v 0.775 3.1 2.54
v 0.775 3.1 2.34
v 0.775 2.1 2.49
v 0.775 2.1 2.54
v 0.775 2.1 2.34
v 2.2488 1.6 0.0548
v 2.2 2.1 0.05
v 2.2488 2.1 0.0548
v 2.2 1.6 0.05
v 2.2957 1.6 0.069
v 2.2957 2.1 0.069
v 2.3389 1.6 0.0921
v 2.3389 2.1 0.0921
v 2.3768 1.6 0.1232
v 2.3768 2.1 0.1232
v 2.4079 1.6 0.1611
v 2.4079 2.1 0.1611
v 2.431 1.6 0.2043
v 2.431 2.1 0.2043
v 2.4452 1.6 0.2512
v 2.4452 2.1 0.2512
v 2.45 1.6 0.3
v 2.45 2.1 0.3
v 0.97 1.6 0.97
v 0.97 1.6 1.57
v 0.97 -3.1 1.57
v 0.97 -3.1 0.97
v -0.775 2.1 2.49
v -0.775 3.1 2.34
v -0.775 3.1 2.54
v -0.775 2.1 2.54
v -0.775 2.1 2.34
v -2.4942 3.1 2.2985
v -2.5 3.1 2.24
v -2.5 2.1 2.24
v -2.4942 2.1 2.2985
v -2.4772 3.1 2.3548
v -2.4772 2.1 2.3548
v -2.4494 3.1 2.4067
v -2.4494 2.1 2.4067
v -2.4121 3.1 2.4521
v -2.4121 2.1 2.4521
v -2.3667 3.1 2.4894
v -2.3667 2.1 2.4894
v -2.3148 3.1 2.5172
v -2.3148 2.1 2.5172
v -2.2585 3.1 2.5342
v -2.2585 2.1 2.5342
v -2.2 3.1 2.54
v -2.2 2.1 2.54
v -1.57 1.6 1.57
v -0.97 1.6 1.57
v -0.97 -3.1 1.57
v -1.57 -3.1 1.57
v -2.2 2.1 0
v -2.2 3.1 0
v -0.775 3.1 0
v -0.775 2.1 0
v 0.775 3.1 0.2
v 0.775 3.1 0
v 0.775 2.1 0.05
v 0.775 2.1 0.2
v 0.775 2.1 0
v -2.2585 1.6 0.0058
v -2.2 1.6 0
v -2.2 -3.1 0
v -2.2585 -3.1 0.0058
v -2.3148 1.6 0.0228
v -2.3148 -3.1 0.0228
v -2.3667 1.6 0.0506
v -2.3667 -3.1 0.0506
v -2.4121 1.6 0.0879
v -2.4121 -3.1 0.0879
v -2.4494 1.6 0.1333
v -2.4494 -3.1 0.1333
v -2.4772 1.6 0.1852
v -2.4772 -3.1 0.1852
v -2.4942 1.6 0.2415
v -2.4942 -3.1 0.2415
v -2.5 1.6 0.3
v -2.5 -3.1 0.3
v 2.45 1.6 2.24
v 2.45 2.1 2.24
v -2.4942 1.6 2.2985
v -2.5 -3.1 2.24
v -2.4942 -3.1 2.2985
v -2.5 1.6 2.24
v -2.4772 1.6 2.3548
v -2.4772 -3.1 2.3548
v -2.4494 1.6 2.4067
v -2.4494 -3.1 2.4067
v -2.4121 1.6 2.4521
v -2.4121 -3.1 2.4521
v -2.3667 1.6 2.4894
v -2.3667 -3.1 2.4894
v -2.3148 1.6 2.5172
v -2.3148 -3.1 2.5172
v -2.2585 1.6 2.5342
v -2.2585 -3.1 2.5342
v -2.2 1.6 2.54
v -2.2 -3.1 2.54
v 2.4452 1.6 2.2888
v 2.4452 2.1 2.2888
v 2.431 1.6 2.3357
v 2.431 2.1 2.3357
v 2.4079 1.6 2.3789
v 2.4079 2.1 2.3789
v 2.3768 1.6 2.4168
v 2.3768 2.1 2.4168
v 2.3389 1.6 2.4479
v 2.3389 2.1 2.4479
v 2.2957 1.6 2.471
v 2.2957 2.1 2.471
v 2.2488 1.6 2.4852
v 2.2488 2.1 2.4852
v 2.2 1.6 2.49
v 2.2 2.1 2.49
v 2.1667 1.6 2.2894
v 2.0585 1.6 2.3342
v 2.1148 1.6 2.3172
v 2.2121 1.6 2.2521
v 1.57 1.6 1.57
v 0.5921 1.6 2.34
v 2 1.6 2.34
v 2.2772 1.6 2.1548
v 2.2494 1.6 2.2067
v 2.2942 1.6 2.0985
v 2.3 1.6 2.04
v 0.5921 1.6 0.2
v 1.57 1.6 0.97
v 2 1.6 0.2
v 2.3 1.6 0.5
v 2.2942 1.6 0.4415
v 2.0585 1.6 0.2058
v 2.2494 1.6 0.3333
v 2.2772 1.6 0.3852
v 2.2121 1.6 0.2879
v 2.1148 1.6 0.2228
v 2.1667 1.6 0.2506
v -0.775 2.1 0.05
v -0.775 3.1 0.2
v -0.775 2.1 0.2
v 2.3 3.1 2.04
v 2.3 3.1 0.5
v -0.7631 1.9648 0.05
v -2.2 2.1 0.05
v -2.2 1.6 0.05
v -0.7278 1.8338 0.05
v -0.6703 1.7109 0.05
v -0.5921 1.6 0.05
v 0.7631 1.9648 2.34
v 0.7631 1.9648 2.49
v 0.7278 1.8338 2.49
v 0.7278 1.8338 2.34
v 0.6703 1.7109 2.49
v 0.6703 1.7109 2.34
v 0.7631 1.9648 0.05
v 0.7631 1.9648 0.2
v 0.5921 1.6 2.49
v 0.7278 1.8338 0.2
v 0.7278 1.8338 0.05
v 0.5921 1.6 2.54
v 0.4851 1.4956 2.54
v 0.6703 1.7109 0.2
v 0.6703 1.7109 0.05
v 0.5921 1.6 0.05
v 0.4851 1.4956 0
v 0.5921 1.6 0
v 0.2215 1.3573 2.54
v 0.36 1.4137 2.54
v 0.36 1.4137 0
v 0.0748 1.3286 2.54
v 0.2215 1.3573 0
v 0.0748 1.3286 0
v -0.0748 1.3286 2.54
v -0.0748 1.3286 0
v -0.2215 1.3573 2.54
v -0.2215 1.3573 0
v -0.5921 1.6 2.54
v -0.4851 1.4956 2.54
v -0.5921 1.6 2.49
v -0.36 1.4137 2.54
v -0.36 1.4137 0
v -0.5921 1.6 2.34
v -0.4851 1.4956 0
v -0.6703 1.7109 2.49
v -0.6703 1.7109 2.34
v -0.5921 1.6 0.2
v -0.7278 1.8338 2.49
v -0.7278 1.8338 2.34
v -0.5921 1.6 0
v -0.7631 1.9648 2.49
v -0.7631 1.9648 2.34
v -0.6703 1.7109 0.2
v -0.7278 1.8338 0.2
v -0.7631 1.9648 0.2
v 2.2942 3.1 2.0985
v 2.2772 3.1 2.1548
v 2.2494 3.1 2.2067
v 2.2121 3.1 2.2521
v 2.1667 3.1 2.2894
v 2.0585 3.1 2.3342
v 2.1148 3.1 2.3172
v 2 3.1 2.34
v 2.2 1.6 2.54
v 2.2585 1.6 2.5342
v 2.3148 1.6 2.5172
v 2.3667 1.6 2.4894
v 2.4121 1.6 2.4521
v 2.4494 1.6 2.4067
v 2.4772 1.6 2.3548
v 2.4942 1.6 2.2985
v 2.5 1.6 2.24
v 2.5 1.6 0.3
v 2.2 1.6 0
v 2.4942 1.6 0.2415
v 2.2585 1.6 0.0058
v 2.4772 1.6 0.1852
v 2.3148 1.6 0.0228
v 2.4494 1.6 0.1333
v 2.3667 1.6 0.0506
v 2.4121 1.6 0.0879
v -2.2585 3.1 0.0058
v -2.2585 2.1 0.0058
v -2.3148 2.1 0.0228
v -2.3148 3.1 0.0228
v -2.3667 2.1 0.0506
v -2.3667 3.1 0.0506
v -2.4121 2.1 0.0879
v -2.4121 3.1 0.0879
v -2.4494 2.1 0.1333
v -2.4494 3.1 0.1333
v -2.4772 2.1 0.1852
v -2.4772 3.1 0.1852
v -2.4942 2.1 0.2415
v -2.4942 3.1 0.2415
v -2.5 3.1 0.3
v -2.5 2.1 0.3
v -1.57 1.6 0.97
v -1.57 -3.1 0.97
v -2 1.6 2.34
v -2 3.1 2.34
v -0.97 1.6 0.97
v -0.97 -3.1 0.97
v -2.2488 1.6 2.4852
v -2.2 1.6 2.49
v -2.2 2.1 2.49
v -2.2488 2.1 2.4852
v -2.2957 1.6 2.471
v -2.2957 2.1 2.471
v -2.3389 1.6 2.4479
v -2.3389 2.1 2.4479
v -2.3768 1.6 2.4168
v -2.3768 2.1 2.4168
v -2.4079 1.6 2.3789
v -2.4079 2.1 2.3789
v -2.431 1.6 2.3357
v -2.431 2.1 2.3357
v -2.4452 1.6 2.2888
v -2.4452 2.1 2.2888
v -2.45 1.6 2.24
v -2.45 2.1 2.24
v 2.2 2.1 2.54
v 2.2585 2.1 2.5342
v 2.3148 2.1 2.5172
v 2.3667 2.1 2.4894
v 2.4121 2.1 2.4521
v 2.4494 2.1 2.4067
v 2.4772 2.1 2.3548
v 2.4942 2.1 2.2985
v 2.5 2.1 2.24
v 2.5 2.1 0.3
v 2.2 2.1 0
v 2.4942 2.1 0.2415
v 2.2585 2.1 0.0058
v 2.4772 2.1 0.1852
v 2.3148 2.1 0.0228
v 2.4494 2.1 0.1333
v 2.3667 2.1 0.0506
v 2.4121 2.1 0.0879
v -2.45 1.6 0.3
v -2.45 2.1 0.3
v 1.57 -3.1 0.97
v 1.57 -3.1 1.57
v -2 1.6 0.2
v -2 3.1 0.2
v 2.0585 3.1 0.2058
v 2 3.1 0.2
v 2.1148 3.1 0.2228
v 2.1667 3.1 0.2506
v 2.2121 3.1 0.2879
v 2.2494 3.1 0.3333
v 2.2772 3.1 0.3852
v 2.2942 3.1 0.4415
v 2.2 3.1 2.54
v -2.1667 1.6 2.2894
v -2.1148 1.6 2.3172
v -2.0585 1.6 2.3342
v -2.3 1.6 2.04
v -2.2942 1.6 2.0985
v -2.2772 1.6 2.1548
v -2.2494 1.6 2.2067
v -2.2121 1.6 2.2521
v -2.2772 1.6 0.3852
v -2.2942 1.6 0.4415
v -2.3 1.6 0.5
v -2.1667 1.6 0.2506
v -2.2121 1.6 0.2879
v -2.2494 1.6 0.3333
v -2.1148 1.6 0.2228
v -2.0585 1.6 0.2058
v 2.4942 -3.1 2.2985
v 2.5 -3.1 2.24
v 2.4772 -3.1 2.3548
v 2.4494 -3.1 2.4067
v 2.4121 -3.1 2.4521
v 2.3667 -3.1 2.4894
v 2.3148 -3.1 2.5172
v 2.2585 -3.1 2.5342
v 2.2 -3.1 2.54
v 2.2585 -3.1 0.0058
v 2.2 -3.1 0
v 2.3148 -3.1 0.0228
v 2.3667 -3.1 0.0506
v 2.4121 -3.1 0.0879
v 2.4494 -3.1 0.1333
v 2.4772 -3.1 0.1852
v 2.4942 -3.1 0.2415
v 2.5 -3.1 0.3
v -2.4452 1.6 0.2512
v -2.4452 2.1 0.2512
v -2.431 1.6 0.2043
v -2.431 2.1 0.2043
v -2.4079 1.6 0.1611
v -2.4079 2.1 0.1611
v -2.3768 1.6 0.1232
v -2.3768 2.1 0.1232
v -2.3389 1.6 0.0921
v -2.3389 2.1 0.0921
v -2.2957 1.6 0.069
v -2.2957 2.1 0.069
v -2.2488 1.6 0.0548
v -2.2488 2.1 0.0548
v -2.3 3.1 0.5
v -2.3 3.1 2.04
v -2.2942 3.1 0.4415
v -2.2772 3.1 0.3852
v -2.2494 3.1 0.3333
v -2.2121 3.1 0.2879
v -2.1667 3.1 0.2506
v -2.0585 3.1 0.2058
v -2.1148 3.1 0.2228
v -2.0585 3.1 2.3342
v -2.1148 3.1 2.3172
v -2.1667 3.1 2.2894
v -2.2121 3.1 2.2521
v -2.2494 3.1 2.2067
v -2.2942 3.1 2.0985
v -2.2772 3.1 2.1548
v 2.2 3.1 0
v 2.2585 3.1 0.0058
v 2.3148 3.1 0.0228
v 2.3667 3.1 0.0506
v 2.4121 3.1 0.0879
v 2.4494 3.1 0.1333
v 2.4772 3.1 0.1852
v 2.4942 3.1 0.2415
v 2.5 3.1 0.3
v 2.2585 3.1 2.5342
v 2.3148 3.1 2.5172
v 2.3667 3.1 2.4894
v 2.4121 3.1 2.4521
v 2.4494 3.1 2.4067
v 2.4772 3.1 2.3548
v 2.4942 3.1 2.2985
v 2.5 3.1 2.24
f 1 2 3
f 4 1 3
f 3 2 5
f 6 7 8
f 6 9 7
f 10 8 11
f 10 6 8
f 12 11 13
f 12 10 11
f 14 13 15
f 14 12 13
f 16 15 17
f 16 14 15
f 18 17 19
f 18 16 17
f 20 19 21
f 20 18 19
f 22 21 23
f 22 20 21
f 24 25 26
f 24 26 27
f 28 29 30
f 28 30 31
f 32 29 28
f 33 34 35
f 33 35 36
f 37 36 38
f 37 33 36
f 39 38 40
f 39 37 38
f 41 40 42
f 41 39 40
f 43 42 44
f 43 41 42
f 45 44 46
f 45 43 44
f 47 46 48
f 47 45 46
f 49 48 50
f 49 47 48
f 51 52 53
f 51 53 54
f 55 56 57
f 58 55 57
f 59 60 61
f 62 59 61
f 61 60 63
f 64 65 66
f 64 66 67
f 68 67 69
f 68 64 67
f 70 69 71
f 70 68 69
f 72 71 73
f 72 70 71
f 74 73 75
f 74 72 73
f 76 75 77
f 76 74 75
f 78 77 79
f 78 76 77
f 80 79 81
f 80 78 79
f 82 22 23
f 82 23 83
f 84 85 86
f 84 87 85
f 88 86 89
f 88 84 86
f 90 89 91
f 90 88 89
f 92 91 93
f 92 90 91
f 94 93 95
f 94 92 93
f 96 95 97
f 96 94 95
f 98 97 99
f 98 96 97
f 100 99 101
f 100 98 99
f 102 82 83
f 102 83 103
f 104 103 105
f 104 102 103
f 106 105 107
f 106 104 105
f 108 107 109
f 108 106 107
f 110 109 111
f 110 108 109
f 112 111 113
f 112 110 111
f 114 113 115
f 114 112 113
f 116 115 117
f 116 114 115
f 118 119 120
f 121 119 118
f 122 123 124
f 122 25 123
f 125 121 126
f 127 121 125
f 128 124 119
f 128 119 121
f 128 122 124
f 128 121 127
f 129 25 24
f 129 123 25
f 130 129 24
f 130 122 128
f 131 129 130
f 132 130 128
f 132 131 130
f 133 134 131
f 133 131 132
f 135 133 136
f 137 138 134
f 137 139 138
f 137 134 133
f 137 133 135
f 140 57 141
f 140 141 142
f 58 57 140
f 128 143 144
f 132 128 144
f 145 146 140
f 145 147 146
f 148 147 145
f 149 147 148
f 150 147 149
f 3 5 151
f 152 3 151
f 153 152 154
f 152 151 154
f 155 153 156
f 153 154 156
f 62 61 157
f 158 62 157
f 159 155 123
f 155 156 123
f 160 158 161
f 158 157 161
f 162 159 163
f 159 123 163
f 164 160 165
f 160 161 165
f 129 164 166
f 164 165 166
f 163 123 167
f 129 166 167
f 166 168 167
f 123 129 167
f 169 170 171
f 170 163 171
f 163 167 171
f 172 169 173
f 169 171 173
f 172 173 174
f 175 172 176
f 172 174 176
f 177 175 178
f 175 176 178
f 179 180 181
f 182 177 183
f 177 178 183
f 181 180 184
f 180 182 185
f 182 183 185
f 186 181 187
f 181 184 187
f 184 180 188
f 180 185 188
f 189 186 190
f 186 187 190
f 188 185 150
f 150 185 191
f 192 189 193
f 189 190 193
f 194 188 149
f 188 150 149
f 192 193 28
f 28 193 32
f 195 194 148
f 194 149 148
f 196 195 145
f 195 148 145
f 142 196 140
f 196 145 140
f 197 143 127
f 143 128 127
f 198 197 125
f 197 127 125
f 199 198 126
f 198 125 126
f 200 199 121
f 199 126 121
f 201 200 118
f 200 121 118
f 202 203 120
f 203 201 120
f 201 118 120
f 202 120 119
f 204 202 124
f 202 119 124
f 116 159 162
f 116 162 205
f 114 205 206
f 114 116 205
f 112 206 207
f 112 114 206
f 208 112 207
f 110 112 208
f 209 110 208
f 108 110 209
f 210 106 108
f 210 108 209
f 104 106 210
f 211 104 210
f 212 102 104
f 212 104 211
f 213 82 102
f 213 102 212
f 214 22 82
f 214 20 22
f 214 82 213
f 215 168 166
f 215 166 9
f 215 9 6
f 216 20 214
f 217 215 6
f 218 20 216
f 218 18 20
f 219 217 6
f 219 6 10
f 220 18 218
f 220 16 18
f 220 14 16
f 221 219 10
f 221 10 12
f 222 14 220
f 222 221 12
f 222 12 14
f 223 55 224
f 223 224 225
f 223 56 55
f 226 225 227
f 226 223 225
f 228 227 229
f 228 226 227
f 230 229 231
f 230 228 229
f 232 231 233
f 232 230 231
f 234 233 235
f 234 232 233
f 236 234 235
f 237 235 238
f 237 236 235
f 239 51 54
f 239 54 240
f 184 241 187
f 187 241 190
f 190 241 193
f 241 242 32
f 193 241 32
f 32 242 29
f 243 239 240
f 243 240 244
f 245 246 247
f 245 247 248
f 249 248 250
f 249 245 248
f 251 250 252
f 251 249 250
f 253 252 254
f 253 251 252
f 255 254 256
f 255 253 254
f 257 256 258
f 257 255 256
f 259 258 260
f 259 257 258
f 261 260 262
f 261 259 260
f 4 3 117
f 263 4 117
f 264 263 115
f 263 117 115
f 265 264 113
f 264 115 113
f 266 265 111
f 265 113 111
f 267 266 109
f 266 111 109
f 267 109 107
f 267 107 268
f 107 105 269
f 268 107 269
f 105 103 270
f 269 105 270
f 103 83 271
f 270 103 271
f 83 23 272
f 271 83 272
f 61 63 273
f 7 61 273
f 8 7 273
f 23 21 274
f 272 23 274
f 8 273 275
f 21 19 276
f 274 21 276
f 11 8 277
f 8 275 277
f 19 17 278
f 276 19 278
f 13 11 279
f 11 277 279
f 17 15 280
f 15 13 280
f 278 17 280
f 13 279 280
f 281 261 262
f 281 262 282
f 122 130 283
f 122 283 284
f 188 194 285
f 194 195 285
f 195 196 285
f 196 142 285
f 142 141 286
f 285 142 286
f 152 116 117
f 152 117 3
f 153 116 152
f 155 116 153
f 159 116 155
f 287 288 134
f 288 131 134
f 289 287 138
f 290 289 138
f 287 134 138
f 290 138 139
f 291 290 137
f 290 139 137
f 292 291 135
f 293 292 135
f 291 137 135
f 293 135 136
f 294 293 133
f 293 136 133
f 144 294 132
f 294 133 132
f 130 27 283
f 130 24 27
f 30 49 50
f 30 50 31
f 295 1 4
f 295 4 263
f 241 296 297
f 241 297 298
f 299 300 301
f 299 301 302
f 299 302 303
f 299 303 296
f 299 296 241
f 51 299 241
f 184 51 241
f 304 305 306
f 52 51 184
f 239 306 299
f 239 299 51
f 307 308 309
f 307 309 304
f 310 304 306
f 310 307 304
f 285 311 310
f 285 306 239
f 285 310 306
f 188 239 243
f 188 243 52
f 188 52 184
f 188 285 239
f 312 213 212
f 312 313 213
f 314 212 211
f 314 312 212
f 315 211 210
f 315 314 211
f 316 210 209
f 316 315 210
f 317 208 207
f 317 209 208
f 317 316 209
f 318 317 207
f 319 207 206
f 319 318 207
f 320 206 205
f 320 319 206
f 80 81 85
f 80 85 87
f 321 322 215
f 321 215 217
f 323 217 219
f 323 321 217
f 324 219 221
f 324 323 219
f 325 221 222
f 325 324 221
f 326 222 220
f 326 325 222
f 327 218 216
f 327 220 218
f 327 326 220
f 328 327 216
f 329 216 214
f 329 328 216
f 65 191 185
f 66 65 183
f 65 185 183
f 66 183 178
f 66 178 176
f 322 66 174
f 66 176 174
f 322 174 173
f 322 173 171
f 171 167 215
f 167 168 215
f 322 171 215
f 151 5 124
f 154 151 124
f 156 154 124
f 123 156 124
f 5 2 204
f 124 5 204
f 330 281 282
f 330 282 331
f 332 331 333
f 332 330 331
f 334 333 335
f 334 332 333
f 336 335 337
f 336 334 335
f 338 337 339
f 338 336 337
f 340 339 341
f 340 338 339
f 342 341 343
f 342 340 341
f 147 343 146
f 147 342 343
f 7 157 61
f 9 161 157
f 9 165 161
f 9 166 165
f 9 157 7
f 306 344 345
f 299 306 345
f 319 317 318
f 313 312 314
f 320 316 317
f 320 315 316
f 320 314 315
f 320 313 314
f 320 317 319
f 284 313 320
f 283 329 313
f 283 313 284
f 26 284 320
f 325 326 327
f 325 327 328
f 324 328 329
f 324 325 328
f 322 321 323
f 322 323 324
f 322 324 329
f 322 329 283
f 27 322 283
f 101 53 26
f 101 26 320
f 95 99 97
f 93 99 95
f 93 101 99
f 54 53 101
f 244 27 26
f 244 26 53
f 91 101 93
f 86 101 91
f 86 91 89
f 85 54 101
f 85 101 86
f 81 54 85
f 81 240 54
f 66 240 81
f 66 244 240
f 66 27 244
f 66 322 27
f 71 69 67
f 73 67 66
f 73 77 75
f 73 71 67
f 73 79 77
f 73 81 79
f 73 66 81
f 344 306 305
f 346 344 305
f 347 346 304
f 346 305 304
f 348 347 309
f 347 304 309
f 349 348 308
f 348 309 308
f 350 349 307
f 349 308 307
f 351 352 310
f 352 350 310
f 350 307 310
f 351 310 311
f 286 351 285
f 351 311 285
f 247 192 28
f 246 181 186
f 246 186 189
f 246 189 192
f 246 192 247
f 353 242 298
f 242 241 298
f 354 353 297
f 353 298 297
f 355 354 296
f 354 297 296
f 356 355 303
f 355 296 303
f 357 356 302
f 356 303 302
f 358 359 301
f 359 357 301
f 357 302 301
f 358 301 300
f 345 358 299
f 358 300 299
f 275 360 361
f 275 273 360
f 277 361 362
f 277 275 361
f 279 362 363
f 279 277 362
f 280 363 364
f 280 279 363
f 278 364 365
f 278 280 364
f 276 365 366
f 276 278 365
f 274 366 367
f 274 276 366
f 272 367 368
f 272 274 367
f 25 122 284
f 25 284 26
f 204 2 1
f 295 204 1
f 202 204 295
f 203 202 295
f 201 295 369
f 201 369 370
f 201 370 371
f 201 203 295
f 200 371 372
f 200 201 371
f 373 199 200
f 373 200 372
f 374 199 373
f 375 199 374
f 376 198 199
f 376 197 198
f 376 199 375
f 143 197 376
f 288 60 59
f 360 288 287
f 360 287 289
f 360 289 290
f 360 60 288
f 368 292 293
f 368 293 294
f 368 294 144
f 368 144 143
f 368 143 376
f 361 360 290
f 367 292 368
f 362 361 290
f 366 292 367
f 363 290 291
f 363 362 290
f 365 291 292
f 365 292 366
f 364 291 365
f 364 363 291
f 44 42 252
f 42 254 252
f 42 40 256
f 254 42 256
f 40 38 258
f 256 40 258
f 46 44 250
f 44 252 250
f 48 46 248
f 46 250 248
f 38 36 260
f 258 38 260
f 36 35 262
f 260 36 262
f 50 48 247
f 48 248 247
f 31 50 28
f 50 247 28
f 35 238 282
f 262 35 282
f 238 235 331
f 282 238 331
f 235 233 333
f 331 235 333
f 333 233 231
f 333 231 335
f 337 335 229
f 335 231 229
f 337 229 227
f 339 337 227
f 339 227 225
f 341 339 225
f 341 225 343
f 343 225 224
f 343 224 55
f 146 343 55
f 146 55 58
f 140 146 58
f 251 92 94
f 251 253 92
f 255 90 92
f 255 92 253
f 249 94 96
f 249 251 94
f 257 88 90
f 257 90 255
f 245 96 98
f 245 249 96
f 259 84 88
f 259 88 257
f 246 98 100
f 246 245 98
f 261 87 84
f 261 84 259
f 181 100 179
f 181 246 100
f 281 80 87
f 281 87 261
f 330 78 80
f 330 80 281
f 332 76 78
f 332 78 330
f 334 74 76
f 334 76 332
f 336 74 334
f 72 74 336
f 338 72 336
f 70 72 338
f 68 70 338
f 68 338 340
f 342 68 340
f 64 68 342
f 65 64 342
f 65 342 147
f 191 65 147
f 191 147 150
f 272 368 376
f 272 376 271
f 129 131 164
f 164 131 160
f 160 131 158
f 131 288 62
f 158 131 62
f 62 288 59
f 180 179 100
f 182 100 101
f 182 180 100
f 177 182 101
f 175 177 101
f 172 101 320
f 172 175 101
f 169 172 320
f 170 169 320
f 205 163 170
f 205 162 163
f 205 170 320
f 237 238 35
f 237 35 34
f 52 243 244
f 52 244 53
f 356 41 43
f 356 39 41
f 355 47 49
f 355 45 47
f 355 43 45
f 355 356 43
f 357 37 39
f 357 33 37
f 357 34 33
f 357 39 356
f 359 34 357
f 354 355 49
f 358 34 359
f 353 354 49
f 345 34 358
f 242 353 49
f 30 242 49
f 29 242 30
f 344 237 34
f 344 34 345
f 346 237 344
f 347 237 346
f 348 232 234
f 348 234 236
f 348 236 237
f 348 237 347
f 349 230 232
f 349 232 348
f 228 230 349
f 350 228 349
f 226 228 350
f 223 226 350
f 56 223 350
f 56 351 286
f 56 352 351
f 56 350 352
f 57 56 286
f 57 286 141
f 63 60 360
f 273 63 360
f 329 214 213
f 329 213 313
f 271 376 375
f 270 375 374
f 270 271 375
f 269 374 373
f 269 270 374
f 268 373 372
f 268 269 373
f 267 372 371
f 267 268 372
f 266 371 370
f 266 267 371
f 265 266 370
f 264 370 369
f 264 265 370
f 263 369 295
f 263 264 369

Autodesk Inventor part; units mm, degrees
ref_plane "YZ Plane" through (0, 0, 0) normal (1, 0, 0) x (0, 1, 0)
ref_plane "XZ Plane" through (0, 0, 0) normal (0, 1, 0) x (-1, 0, 0)
ref_plane "XY Plane" through (0, 0, 0) normal (0, 0, 1) x (1, 0, 0)
sketch "Sketch1" plane through (0, 0, 0) normal (0, 0, 1) x (1, 0, 0)
  line L0 (-2.5, 3.1) -> (2.5, 3.1)
  line L1 (2.5, 3.1) -> (2.5, -3.1)
  line L2 (2.5, -3.1) -> (-2.5, -3.1)
  line L3 (-2.5, -3.1) -> (-2.5, 3.1)
  line L4 (-2.5, 3.1) -> (2.5, -3.1) construction
  line L5 (2.5, 3.1) -> (-2.5, -3.1) construction
  line L6 (-0.775, 3.1) -> (-0.775, 2.1)
  line L7 (0.775, 3.1) -> (0.775, 2.1)
  arc A0 (-0.775, 2.1) -> (0.775, 2.1) centre (0, 2.1) ccw
  point P0 (0, 0)
  point P1 (0, 3.1)
  dimension "d0" = 6.2
  dimension "d1" = 5
  dimension "d2" = 1
  dimension "d3" = 1
  dimension "d4" = 1.55
extrude "Extrusion1" add sketch "Sketch1" along normal blind 2.54 contours L0 L6 A0 L7 L1 L2 L3
sketch "Sketch2" plane through (-2.5, 3.1, 0) normal (0, 1, 0) x (1, 0, 0)
  line L0 (0.2, -2.34) -> (4.8, -2.34)
  line L1 (4.8, -2.34) -> (4.8, -0.2)
  line L2 (4.8, -0.2) -> (0.2, -0.2)
  line L3 (0.2, -0.2) -> (0.2, -2.34)
  line L4 (0.2, -2.34) -> (4.8, -0.2) construction
  line L5 (4.8, -2.34) -> (0.2, -0.2) construction
  line L6 (0, 0) -> (0, -2.54) projected
  line L7 (1.725, 0) -> (0, 0) projected
  point P0 (2.5, 0)
  point P1 (2.5, -1.27)
  point P2 (0, -1.27)
  point P3 (0.8625, 0)
  dimension "d7" = 0.2
  dimension "d8" = 0.2
extrude "Extrusion2" cut sketch "Sketch2" against normal blind 1.5
sketch "Sketch3" plane through (-2.5, 1.6, 0) normal (0, 1, 0) x (1, 0, 0)
  line L0 (0.93, -0.97) -> (1.53, -0.97)
  line L1 (1.53, -0.97) -> (1.53, -1.57)
  line L2 (1.53, -1.57) -> (0.93, -1.57)
  line L3 (0.93, -1.57) -> (0.93, -0.97)
  line L4 (0.93, -0.97) -> (1.53, -1.57) construction
  line L5 (1.53, -0.97) -> (0.93, -1.57) construction
  line L6 (3.47, -0.97) -> (4.07, -0.97)
  line L7 (4.07, -0.97) -> (4.07, -1.57)
  line L8 (4.07, -1.57) -> (3.47, -1.57)
  line L9 (3.47, -1.57) -> (3.47, -0.97)
  line L10 (3.47, -0.97) -> (4.07, -1.57) construction
  line L11 (4.07, -0.97) -> (3.47, -1.57) construction
  line L12 (5, 0) -> (5, -2.54) projected
  point P0 (2.5, 0)
  point P1 (1.23, -1.27)
  point P2 (3.77, -1.27)
  point P3 (5, -1.27)
  dimension "d11" = 0.6
  dimension "d12" = 0.6
  dimension "d13" = 0.6
  dimension "d14" = 0.6
  dimension "d15" = 2.54
  dimension "d16" = 1.27
extrude "Extrusion3" cut sketch "Sketch3" against normal up to surface (4.7 mm away)
fillet "Fillet1" radius 0.3 8 edges at (-2.5, 0, 2.54) (-2.5, 0, 0) (2.5, 0, 2.54) (2.5, 0, 0) (2.3, 2.35, 0.2) (2.3, 2.35, 2.34) (-2.3, 2.35, 0.2) (-2.3, 2.35, 2.34)
sketch "Sketch4" plane through (-2.5, 1.6, 0) normal (0, 1, 0) x (1, 0, 0)
  line L0 (1.725, 0) -> (0.3, 0) projected
  arc A0 (0.3, 0) -> (0, -0.3) centre (0.3, -0.3) ccw projected
  line L1 (0, -0.3) -> (0, -2.24) projected
  arc A1 (0, -2.24) -> (0.3, -2.54) centre (0.3, -2.24) ccw projected
  line L2 (1.725, -2.54) -> (0.3, -2.54) projected
  line L3 (3.275, -2.54) -> (1.725, -2.54) projected
  line L4 (4.7, -2.54) -> (3.275, -2.54) projected
  arc A2 (4.7, -2.54) -> (5, -2.24) centre (4.7, -2.24) ccw projected
  line L5 (5, -0.3) -> (5, -2.24) projected
  arc A3 (5, -0.3) -> (4.7, 0) centre (4.7, -0.3) ccw projected
  line L6 (4.7, 0) -> (3.275, 0) projected
  line L7 (3.275, 0) -> (1.725, 0) projected
  arc A4 (0.05, -2.24) -> (0.3, -2.49) centre (0.3, -2.24) ccw
  line L8 (0.05, -2.24) -> (0.05, -0.3)
  arc A5 (0.3, -0.05) -> (0.05, -0.3) centre (0.3, -0.3) ccw
  line L9 (0.3, -0.05) -> (1.725, -0.05)
  line L10 (1.725, -0.05) -> (3.275, -0.05)
  line L11 (3.275, -0.05) -> (4.7, -0.05)
  arc A6 (4.95, -0.3) -> (4.7, -0.05) centre (4.7, -0.3) ccw
  line L12 (4.95, -0.3) -> (4.95, -2.24)
  arc A7 (4.7, -2.49) -> (4.95, -2.24) centre (4.7, -2.24) ccw
  line L13 (4.7, -2.49) -> (3.275, -2.49)
  line L14 (3.275, -2.49) -> (1.725, -2.49)
  line L15 (1.725, -2.49) -> (0.3, -2.49)
  point P0 (2.5, 0)
  dimension "d20" = 0.05
extrude "Extrusion4" cut sketch "Sketch4" along normal blind 0.5
equation "\"d3\" = d2"
equation "\"d8\" = d7"
equation "\"d12\" = d11"
equation "\"d13\" = d11"
equation "\"d14\" = d11"
equation "\"d16\" = 0.5 * d15"
properties part number "Retrigger Resetting Jumper"
